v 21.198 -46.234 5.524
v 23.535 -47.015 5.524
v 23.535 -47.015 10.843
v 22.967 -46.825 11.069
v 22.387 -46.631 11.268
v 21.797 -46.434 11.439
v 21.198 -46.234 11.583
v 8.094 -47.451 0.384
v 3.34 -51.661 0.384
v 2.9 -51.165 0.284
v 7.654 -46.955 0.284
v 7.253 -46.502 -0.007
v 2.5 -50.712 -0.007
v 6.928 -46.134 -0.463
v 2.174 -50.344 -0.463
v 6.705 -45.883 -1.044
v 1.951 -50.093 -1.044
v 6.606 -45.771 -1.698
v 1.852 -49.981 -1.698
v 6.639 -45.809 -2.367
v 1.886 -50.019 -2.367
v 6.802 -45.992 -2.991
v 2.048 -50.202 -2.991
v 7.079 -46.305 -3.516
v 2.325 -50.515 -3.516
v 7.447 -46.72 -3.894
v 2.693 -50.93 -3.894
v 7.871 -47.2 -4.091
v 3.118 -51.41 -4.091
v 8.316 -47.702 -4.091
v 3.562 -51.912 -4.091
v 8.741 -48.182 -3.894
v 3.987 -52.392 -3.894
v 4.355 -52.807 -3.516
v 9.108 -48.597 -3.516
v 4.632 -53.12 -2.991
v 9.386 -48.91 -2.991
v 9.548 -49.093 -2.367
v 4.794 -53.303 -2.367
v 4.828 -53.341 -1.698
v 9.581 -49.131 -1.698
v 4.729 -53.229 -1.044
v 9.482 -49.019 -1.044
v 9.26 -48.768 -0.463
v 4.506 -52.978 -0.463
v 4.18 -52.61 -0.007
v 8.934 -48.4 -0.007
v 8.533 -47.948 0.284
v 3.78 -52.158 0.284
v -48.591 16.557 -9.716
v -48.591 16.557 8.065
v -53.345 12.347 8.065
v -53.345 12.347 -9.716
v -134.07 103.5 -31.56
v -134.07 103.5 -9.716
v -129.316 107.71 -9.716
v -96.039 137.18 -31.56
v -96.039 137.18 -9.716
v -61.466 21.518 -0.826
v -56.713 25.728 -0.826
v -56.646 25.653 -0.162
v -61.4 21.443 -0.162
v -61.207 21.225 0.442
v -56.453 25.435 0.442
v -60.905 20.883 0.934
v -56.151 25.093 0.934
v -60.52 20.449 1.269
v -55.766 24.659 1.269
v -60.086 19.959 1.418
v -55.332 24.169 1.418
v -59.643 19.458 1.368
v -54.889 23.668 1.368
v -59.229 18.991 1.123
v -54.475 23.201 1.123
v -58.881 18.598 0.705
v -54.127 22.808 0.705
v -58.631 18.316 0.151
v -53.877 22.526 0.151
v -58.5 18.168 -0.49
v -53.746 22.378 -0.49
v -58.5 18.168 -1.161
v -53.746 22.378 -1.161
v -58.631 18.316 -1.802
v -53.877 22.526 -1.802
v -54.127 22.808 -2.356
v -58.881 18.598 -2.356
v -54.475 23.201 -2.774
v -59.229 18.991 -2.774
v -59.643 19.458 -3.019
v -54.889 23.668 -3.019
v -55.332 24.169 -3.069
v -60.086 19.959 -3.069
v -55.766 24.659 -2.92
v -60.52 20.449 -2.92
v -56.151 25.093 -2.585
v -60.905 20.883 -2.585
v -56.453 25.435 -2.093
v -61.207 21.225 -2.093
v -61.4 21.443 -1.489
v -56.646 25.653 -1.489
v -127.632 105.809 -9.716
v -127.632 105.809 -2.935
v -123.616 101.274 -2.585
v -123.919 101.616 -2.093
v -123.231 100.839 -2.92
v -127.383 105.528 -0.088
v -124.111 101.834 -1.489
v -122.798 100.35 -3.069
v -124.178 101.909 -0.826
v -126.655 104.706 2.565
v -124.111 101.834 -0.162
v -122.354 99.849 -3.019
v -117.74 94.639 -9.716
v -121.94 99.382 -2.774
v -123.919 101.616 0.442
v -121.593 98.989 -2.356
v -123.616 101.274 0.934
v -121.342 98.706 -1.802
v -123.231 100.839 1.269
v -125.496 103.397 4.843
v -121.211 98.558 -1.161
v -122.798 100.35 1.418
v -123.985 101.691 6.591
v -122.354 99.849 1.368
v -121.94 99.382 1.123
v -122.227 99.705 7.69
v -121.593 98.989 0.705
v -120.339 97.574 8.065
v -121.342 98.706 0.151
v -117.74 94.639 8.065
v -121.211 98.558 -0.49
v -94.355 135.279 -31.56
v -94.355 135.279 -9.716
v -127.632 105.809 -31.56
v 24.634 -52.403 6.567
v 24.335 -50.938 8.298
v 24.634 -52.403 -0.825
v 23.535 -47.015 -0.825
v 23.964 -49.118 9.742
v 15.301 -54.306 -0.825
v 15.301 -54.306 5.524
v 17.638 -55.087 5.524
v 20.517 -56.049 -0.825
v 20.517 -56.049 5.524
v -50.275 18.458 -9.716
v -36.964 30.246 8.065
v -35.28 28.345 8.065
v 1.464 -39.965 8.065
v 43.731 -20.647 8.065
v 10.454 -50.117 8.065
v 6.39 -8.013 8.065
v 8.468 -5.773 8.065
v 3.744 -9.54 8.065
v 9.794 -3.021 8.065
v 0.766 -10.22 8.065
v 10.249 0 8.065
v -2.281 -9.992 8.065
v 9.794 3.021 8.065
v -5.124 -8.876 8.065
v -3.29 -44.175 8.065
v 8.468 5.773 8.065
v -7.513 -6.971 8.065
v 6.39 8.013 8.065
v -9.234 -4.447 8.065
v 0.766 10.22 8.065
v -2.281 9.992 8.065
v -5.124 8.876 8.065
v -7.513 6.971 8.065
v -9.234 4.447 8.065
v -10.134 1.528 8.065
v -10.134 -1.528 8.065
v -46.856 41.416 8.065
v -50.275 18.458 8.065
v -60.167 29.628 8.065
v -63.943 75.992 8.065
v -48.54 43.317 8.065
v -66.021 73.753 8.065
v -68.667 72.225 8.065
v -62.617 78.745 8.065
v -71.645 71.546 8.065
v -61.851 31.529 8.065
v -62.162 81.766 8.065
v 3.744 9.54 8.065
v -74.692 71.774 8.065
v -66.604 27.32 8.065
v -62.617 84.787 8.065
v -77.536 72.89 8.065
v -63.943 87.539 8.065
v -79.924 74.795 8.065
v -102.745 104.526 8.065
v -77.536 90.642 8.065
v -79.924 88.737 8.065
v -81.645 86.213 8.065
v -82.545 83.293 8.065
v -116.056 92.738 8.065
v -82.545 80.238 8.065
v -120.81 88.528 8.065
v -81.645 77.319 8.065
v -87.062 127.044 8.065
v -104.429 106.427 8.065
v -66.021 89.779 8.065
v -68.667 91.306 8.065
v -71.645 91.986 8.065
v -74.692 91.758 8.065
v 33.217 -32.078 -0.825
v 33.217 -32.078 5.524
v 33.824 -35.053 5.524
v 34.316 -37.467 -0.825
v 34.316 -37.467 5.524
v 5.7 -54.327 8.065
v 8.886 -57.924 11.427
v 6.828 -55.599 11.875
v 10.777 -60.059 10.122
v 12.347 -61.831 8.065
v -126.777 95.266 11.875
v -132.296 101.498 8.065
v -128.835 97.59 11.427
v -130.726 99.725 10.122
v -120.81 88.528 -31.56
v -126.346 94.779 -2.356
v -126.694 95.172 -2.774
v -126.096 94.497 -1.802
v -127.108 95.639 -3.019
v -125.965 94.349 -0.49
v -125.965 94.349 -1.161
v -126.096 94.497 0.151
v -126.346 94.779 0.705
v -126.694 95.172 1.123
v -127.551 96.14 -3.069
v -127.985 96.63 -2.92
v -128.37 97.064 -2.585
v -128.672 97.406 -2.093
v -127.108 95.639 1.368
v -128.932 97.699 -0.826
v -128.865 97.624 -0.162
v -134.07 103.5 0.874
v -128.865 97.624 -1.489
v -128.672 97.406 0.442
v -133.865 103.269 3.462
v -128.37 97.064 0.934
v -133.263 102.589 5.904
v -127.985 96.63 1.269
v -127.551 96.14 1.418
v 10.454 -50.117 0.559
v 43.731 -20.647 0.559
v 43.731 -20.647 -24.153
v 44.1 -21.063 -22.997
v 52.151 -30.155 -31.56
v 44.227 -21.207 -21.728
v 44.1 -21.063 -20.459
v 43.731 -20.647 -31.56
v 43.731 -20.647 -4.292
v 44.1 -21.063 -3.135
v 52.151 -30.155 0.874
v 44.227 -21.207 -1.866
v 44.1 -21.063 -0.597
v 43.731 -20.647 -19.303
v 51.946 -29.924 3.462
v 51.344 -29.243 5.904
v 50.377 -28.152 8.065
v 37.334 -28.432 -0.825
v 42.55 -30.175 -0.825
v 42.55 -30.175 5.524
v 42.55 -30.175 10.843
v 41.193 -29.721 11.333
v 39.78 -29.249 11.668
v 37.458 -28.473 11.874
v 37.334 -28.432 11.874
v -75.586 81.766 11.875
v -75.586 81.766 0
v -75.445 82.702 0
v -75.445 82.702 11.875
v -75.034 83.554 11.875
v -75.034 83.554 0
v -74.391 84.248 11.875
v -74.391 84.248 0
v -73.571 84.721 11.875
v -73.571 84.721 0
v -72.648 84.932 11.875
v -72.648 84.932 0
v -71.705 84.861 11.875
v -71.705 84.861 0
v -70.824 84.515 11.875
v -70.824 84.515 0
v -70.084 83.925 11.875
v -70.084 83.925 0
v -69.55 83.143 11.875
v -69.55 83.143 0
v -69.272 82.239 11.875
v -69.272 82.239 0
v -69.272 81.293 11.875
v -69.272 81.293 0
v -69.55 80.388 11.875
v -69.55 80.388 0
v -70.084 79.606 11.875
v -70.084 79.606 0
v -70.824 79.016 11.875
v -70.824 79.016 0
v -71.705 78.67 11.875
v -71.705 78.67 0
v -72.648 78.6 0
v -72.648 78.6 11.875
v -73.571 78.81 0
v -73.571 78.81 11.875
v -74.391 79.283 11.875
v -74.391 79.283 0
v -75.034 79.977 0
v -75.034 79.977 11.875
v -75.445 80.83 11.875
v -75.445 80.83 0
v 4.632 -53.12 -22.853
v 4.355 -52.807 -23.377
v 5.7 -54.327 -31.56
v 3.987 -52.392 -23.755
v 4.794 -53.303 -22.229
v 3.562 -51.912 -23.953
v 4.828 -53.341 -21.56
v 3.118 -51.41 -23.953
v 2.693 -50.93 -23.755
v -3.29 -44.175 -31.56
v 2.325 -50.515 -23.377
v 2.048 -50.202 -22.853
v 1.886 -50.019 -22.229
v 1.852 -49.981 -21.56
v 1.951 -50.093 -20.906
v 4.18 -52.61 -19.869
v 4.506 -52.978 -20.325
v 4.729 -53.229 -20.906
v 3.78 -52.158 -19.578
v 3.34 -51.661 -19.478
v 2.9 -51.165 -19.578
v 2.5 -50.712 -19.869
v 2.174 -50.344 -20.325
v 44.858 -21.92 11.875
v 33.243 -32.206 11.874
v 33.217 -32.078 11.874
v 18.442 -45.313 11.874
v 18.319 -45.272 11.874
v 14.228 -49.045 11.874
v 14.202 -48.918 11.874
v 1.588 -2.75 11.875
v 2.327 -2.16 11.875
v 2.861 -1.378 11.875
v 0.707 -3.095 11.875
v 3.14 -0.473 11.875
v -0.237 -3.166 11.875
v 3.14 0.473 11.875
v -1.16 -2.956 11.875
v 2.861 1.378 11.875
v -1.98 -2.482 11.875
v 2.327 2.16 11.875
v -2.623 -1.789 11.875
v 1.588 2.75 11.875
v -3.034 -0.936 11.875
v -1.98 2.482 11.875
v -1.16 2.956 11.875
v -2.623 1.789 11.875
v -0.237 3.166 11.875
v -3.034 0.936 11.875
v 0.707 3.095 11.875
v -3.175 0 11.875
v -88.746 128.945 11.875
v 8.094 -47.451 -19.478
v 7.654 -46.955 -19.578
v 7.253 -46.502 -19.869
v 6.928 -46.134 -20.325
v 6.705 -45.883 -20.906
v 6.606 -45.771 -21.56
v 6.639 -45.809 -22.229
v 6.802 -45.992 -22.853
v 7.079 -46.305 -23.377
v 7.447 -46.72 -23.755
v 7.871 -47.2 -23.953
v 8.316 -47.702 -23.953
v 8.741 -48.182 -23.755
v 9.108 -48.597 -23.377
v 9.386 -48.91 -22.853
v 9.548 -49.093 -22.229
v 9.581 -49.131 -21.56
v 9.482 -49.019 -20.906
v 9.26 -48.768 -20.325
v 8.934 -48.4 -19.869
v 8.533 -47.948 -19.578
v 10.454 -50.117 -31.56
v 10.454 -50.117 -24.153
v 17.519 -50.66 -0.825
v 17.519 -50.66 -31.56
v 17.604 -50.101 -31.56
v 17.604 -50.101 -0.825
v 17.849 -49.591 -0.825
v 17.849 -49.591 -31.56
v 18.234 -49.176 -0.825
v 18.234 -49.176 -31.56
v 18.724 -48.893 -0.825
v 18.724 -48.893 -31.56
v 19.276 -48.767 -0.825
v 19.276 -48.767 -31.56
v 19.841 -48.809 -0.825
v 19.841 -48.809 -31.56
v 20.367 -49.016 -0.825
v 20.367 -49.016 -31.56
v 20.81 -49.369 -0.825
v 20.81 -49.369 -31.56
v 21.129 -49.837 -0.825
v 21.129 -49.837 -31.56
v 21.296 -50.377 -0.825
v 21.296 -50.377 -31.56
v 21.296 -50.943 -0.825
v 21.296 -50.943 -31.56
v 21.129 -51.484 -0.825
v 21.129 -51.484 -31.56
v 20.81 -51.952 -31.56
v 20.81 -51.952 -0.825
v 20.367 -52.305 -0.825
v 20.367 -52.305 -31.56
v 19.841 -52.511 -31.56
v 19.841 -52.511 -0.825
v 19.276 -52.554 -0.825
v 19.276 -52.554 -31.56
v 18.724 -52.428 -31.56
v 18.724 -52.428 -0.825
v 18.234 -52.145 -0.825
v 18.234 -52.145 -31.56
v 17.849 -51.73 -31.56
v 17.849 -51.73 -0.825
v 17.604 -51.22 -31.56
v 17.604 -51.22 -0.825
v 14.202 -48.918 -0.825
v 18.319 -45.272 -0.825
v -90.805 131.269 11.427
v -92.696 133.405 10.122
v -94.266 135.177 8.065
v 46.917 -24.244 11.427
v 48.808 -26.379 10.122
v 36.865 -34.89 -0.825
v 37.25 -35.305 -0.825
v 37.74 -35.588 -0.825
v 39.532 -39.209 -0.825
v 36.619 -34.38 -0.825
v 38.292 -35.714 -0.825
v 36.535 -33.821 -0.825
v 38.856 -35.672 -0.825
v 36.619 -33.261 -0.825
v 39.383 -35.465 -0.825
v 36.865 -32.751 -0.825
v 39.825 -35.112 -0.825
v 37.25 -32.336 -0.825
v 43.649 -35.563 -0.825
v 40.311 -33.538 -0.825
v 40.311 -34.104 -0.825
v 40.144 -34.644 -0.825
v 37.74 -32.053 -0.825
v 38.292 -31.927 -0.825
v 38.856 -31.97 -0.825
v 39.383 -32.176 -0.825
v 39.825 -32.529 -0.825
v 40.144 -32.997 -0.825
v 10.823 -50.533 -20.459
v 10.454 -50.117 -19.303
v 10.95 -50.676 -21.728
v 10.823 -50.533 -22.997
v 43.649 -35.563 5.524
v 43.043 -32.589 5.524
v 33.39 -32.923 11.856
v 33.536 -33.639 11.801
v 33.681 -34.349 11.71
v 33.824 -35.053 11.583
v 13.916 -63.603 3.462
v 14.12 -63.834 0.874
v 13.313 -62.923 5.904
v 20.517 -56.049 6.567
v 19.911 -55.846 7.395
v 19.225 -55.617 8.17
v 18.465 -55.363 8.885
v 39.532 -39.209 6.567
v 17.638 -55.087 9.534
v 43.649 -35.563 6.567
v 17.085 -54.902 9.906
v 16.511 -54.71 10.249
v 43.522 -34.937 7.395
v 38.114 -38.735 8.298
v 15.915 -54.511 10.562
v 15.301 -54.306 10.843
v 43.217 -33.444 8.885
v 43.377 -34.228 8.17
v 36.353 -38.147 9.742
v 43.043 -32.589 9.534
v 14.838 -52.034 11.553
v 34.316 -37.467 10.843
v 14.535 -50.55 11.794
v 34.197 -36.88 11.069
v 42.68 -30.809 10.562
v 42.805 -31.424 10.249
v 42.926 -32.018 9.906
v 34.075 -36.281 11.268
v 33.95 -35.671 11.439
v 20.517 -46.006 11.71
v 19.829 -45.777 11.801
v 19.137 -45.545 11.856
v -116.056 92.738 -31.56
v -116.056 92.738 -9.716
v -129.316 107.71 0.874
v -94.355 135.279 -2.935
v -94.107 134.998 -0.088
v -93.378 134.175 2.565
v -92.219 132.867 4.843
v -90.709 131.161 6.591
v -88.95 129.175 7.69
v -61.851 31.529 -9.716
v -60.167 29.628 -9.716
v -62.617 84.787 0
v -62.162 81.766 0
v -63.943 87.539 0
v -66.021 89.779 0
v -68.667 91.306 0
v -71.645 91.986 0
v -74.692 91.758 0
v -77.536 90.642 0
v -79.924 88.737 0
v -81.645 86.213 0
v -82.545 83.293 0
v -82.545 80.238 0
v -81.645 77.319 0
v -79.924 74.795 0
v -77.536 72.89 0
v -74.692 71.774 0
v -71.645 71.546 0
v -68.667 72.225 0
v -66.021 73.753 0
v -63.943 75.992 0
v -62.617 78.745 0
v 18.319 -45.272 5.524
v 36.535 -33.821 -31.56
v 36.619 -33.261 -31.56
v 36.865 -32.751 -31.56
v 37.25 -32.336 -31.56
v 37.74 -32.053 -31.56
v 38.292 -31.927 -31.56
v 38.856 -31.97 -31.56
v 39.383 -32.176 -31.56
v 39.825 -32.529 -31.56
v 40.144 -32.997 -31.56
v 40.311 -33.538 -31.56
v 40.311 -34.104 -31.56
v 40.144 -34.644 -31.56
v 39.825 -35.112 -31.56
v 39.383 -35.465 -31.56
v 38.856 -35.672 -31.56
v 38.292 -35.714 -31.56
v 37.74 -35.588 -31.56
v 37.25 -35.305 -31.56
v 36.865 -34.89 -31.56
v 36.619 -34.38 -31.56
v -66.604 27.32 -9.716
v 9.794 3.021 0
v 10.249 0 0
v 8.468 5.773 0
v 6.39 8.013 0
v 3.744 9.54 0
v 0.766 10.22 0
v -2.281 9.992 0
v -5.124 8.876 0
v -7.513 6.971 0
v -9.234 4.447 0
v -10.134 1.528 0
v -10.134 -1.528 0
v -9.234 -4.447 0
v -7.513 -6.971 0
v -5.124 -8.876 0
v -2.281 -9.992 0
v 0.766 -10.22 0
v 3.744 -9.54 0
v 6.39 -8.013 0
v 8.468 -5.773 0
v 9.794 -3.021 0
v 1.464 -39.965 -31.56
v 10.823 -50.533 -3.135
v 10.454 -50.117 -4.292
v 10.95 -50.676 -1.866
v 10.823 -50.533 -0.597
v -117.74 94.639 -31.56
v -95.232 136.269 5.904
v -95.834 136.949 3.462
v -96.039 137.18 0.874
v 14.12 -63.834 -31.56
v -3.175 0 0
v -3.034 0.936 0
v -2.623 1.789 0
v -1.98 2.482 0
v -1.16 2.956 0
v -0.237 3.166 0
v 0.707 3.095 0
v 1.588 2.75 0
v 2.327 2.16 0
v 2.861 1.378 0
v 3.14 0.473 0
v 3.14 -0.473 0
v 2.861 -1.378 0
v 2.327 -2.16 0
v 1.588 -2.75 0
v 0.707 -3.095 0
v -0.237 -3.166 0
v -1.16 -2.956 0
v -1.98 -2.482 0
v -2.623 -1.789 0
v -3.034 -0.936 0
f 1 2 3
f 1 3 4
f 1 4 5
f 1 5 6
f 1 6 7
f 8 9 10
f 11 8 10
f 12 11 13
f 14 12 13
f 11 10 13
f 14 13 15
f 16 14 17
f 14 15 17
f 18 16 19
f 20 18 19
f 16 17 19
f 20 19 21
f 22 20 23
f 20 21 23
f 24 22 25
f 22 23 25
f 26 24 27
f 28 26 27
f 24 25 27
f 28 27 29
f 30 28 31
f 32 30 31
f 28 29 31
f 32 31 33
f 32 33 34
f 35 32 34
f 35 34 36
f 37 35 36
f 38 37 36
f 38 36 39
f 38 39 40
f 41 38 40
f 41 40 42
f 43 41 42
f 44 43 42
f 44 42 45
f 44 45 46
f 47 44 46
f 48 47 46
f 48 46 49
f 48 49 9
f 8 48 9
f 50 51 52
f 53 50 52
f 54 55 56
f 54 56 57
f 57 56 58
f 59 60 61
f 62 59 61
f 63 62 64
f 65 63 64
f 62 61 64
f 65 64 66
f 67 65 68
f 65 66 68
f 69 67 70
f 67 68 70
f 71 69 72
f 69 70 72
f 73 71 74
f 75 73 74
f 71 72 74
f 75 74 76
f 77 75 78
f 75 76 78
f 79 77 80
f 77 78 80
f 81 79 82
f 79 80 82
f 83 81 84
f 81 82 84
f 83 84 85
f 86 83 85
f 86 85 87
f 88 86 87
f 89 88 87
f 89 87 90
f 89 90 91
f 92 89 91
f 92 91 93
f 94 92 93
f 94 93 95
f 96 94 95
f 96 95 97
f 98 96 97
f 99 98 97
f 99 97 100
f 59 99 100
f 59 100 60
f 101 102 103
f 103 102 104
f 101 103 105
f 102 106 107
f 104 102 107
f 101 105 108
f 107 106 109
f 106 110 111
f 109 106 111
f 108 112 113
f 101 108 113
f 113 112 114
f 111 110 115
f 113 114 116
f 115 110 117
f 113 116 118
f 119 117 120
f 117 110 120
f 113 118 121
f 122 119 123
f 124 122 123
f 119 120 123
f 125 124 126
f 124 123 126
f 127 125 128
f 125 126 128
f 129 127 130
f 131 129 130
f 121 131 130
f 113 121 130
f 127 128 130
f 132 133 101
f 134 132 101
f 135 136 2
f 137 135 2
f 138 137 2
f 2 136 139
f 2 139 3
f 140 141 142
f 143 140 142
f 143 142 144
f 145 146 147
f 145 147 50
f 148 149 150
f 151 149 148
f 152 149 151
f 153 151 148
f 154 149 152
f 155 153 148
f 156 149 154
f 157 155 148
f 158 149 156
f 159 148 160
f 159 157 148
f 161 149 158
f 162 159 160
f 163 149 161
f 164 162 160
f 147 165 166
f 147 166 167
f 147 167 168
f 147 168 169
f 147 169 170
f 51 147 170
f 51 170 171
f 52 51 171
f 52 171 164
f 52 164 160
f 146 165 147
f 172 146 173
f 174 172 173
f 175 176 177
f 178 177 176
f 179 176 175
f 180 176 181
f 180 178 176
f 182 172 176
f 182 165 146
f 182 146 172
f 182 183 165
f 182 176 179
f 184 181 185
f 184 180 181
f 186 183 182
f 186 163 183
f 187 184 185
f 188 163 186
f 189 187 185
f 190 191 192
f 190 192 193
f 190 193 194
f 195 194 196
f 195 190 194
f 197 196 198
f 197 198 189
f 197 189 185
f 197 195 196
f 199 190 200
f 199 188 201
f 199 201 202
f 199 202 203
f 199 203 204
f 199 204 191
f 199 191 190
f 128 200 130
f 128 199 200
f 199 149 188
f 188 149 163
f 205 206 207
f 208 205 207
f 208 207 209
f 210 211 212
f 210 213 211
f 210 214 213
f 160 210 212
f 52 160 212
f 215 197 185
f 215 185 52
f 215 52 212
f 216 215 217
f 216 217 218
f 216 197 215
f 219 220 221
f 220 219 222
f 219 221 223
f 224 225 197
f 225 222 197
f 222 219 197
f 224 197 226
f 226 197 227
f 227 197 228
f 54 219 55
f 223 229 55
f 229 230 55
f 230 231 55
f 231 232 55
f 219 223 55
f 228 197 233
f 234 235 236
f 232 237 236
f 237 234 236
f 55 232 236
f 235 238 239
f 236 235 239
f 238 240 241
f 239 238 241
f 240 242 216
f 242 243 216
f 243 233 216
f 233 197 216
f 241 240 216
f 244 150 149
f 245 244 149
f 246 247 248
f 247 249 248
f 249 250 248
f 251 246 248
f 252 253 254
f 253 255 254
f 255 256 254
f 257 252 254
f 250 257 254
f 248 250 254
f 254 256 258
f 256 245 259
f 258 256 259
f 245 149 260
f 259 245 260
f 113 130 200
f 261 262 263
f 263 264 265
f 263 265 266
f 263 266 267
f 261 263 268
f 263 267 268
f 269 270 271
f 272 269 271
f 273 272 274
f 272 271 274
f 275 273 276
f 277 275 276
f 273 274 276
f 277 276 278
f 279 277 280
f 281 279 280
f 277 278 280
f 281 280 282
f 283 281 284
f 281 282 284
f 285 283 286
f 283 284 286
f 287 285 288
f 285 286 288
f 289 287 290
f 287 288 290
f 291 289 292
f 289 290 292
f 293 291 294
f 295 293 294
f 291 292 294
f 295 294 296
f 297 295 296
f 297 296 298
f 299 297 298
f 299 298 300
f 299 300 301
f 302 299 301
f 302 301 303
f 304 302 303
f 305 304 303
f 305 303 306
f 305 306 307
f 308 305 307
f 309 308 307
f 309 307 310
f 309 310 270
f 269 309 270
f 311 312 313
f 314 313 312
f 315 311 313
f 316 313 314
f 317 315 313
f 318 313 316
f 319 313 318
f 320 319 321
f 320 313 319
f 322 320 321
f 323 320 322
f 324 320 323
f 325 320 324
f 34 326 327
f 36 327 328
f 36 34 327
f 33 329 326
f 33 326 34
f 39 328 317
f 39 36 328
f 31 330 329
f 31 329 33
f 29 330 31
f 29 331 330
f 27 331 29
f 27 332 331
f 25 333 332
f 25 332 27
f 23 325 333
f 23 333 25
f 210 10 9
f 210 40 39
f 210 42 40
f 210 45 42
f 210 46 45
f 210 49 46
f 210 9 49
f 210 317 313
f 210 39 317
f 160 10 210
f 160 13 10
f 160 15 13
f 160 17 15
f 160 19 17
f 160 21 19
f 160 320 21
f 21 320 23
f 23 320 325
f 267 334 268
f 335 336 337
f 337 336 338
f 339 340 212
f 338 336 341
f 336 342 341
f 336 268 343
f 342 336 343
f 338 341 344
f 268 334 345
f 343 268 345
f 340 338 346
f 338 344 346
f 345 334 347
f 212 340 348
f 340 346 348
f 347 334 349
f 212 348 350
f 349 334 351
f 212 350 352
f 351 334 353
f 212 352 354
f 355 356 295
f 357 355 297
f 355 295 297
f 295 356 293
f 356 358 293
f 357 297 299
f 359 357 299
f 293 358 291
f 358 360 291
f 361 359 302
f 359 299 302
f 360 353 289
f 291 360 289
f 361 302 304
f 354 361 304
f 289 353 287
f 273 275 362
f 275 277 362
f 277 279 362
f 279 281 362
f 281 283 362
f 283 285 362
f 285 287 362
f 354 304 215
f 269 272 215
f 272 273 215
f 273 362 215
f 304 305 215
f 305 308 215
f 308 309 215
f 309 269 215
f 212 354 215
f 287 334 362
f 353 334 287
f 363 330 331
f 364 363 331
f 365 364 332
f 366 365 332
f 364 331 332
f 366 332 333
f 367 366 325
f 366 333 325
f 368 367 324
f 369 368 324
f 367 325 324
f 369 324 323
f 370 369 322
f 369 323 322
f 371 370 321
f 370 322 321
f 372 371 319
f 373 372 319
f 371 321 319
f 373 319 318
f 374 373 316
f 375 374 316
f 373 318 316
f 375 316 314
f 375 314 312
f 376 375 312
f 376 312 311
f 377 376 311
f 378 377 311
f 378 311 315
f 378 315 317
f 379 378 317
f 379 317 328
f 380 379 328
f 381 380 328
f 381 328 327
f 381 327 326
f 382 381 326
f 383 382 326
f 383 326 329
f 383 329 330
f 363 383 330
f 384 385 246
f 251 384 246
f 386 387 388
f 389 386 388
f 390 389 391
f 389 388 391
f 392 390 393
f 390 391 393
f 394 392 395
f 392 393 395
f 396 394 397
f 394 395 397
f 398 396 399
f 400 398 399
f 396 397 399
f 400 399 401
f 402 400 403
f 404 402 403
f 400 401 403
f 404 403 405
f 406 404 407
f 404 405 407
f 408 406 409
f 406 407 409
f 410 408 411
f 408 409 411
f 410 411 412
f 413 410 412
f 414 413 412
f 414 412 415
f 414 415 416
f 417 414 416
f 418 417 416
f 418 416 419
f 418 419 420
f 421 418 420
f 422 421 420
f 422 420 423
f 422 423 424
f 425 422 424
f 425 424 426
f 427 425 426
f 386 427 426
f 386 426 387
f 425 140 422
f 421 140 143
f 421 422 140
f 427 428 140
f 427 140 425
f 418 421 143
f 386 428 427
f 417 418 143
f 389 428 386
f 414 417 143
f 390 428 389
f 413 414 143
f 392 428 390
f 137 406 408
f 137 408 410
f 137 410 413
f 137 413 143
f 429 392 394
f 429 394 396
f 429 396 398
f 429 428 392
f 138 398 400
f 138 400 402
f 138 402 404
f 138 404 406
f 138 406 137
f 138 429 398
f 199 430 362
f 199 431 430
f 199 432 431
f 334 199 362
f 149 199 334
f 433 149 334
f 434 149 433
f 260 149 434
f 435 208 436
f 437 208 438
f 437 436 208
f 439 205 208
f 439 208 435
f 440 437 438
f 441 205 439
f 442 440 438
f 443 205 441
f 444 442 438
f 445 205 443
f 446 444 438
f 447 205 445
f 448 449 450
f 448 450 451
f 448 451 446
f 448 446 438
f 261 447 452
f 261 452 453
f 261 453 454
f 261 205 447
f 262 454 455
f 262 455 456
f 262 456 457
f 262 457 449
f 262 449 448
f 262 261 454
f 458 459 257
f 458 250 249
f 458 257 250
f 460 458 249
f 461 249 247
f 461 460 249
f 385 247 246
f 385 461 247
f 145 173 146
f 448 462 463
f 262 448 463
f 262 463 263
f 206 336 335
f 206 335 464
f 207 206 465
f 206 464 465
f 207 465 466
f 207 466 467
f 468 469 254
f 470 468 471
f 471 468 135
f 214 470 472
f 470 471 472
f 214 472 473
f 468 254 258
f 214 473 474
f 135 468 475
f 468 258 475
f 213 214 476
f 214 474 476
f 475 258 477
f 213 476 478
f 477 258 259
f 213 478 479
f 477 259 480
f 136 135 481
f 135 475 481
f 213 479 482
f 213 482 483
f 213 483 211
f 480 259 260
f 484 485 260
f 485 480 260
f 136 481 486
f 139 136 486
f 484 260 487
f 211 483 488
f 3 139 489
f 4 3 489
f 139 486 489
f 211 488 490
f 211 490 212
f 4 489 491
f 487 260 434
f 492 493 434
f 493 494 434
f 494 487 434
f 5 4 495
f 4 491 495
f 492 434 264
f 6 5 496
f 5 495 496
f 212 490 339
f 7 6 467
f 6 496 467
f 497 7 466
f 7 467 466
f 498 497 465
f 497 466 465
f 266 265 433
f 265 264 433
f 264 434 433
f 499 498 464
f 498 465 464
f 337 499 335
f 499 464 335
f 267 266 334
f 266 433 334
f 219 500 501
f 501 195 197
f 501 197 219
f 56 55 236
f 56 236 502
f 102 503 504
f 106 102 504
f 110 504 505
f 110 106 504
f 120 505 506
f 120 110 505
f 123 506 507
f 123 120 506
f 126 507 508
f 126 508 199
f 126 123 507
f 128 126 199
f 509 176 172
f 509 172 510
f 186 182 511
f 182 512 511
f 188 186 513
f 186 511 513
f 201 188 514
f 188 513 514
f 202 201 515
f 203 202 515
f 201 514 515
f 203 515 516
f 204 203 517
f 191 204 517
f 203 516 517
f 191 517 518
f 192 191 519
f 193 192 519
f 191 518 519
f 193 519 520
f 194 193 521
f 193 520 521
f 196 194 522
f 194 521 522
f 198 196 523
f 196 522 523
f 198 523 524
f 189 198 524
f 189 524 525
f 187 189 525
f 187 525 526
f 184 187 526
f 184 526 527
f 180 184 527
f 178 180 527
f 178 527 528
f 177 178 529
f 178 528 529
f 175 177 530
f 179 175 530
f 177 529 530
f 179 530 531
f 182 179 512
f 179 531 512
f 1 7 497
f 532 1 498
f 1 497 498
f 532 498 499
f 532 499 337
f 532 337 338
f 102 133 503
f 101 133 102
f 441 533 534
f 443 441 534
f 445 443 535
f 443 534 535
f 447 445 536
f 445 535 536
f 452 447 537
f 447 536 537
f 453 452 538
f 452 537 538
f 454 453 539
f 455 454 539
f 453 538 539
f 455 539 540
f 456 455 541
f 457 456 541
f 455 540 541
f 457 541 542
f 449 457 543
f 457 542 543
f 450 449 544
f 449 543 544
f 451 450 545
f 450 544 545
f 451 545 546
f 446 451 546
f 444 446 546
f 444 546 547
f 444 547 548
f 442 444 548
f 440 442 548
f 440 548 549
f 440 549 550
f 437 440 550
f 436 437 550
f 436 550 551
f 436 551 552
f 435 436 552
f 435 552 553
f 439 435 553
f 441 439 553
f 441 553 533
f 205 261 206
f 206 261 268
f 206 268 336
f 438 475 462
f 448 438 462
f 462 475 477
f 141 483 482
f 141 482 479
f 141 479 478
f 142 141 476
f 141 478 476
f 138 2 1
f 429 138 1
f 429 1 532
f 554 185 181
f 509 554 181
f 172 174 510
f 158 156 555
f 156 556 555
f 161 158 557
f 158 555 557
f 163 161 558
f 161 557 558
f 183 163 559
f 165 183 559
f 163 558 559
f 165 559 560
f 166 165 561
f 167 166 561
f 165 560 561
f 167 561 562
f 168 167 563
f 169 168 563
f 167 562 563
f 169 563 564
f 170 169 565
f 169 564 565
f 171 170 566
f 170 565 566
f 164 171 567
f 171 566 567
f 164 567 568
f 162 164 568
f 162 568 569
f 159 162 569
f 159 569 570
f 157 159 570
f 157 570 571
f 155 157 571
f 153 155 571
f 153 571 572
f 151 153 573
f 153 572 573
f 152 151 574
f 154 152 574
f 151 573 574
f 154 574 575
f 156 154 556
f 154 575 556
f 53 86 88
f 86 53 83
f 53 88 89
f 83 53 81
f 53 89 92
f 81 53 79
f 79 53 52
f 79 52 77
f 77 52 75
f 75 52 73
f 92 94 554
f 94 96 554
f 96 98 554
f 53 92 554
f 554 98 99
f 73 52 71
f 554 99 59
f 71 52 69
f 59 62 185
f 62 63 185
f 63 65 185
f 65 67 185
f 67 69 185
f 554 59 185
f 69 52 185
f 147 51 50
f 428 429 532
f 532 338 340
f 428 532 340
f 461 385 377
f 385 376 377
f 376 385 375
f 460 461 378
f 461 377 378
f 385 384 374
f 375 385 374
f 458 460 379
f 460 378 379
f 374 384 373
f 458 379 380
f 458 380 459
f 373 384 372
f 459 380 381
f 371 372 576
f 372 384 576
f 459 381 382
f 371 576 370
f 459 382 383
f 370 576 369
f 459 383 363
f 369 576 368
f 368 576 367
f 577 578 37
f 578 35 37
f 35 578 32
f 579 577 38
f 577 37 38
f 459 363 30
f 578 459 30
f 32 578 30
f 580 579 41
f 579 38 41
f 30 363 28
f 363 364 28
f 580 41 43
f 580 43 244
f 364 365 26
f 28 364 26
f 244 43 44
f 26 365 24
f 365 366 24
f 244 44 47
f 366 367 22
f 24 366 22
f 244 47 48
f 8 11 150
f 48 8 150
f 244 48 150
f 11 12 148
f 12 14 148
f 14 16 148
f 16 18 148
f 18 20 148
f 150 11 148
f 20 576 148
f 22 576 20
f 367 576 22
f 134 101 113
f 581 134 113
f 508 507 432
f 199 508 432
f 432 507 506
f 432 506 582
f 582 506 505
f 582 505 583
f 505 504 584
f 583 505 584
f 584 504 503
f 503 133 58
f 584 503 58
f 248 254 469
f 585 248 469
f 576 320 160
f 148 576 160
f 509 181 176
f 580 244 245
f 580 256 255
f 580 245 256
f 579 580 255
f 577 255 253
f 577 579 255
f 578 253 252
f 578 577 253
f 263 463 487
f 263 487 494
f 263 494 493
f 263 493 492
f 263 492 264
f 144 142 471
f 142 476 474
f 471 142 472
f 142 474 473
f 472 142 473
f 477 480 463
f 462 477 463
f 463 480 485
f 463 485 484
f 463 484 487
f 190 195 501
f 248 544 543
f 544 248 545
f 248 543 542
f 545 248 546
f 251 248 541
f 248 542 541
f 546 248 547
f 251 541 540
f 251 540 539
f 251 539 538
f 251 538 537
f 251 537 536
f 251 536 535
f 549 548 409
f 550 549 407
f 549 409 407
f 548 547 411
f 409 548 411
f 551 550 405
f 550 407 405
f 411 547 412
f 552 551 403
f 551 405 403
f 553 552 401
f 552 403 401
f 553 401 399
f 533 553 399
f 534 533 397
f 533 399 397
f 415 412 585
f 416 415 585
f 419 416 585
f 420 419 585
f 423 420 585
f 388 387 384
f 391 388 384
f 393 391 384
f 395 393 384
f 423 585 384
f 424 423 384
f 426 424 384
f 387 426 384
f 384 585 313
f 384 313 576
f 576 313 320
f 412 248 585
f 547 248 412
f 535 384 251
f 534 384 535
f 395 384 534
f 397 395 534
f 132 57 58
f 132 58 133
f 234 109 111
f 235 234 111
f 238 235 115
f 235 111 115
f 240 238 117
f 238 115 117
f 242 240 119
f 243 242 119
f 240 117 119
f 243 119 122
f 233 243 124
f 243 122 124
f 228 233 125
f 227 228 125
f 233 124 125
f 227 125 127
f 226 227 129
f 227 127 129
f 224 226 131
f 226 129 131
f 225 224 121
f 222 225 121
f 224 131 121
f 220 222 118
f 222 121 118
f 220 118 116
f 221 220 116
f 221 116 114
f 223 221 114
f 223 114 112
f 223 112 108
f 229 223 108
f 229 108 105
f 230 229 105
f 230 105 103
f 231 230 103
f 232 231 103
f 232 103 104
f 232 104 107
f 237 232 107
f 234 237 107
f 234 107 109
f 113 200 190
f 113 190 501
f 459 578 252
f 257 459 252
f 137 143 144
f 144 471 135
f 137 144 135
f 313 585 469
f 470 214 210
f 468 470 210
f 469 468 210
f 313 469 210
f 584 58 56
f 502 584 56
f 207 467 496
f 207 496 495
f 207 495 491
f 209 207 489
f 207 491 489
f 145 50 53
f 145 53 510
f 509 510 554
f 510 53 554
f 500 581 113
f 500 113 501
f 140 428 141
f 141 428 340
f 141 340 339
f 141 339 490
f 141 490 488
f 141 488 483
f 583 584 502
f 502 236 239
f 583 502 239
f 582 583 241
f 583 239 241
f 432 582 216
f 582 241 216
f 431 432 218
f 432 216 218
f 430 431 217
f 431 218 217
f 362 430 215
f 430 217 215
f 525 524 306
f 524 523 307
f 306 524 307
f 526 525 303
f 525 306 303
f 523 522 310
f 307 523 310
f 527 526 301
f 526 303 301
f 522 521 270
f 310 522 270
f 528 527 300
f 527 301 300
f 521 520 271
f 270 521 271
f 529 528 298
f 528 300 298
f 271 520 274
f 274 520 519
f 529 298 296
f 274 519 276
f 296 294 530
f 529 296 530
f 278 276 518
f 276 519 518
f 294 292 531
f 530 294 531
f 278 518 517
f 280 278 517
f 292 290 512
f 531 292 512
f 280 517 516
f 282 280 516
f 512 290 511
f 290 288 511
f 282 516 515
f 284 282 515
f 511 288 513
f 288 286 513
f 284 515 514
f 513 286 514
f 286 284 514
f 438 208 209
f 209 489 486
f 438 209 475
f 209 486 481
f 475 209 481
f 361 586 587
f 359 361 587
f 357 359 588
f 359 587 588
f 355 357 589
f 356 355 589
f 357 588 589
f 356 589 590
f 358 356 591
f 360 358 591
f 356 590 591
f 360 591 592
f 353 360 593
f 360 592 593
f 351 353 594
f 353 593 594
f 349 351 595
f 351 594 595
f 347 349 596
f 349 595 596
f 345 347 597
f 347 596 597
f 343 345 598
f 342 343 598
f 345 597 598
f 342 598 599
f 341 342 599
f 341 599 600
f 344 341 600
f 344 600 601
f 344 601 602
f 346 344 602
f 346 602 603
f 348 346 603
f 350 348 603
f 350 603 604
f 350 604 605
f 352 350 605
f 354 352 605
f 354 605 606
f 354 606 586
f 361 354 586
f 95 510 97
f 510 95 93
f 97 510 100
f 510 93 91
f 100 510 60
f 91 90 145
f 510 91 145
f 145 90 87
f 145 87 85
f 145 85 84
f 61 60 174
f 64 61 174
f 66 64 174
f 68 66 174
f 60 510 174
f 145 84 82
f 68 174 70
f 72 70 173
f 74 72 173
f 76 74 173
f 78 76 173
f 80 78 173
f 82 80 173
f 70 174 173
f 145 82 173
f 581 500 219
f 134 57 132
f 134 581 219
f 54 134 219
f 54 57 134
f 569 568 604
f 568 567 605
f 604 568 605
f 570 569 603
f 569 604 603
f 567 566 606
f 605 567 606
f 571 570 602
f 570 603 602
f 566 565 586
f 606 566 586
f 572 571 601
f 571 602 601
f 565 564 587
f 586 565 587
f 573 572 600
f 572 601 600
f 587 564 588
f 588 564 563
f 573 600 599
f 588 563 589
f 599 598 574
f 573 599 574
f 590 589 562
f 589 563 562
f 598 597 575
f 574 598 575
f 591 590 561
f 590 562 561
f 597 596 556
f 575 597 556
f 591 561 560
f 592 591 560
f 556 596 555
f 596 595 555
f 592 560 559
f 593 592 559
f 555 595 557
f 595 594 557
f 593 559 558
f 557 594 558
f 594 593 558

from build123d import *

# Parameters (mm, degrees)
SKETCH1_R                   = 10.2489
BOSS_EXTRUDE1_DEPTH         = 2.9845
BOSS_EXTRUDE1_2_DEPTH       = 2.9845
SKETCH2_R                   = 10.2489
BOSS_EXTRUDE2_DEPTH         = 5.08
BOSS_EXTRUDE3_DEPTH         = 3.81
F_1_4_0_25_DIAMETER_HOLE1_D = 6.35
BOSS_EXTRUDE4_DEPTH         = 17.78
SKETCH8_R                   = 2.25
CUT_EXTRUDE1_DEPTH          = 17.78
SKETCH9_W                   = 17.78
SKETCH9_H                   = 2.54
BOSS_EXTRUDE5_DEPTH         = 17.78
CUT_EXTRUDE2_REACH          = 251.039
CUT_EXTRUDE3_DEPTH          = 20
BOSS_EXTRUDE6_DEPTH         = 2.54
BOSS_EXTRUDE7_DEPTH         = 39.624
CUT_EXTRUDE5_DEPTH          = 6.35
F_6_CLEARANCE_HOLE1_D       = 3.7973
SKETCH19_W                  = 39.624
SKETCH19_H                  = 13.560471889
BOSS_EXTRUDE8_DEPTH         = 6.35
M4_CLEARANCE_HOLE1_D        = 4.5
SKETCH20_R                  = 4.308
CUT_EXTRUDE6_DEPTH          = 195.822050963
FILLET1_R                   = 11
CUT_EXTRUDE7_DEPTH          = 6.35
BOSS_EXTRUDE9_DEPTH         = 21.844


with BuildPart() as part:
    # Sketch1 → Boss-Extrude1 (new body)
    with BuildSketch(Plane.XY):
        Circle(SKETCH1_R)
    extrude(amount=BOSS_EXTRUDE1_DEPTH)



with BuildPart() as body_2:
    # Sketch1 → Boss-Extrude1 2 (new body)
    with BuildSketch(Plane.XY):
        with Locations((-72.411066703, 81.765798589)):
            Circle(SKETCH1_R)
    extrude(amount=BOSS_EXTRUDE1_2_DEPTH)


with BuildPart() as part_1:
    add(part.part)

    add(body_2.part)  # Boss-Extrude2 merges body 2
    # Sketch2 → Boss-Extrude2 (add)
    with BuildSketch(Plane.XY.offset(2.9845)):
        with Locations((-72.411066703, 81.765798589)):
            Circle(SKETCH2_R)
        Circle(SKETCH2_R)
    extrude(amount=BOSS_EXTRUDE2_DEPTH)

    # Sketch3 → Boss-Extrude3 (add)
    with BuildSketch(Plane.XY.offset(8.0645)):
        Polygon((-134.069705847, 103.500499391), (-96.039101852, 137.180065299), (52.150988145, -30.154592279), (14.12038415, -63.834158187), align=None)
    extrude(amount=BOSS_EXTRUDE3_DEPTH)

    # 1/4 (0.25) Diameter Hole1 (through all)
    with Locations(Plane.XY.offset(11.8745)):
        with Locations((0, 0), (-72.411066703, 81.765798589)):
            Hole(F_1_4_0_25_DIAMETER_HOLE1_D / 2)

    # Sketch7 → Boss-Extrude4 (add)
    with BuildSketch(Plane(origin=(0, 0, 8.0645), x_dir=(-1, 0, 0), z_dir=(0, 0, -1))):
        Polygon((53.34482504, 12.346831233), (66.604496657, 27.319509971), (61.850671158, 31.529455709), (48.59099954, 16.556776971), align=None)
        Polygon((120.810034229, 88.527820652), (134.069705847, 103.500499391), (129.315880348, 107.710445129), (116.05620873, 92.737766391), align=None)
    extrude(amount=BOSS_EXTRUDE4_DEPTH)

    # Sketch8 → Cut-Extrude1 (cut)
    with BuildSketch(Plane(origin=(-19.015301997, -16.839782954, 0), x_dir=(0, 0, -1), z_dir=(0.7486339369082552, 0.6629835808745542, 0))):
        with Locations(Location((0.8255, 54.61, 0), (0, 0, 90))):
            Circle(SKETCH8_R)
        with Locations(Location((0.8255, 156.37, 0), (0, 0, 90))):
            Circle(SKETCH8_R)
    extrude(amount=-CUT_EXTRUDE1_DEPTH, mode=Mode.SUBTRACT)

    # Sketch9 → Boss-Extrude5 (add)
    with BuildSketch(Plane(origin=(-19.015301997, -16.839782954, 0), x_dir=(0, 0, -1), z_dir=(0.7486339369082552, 0.6629835808745542, 0))):
        with Locations((0.8255, 63.34)):
            Rectangle(SKETCH9_W, SKETCH9_H)
        with Locations((0.8255, 45.88)):
            Rectangle(SKETCH9_W, SKETCH9_H)
        with Locations((0.8255, 165.1)):
            Rectangle(SKETCH9_W, SKETCH9_H)
        with Locations((0.8255, 147.64)):
            Rectangle(SKETCH9_W, SKETCH9_H)
    extrude(amount=BOSS_EXTRUDE5_DEPTH)

    # Cut-Extrude2: up to this face of the body (flat: up to its plane)
    cut_extrude2_end = Plane(part_1.part.faces().sort_by_distance((-111.777765781, 96.526717556, -0.8255))[0])
    # Sketch10 → Cut-Extrude2 (cut, up to the picked face)
    with BuildSketch(Plane(origin=(-110.30057835, 124.550228083, 0), x_dir=(0.7486339369082557, 0.6629835808745536, 0), z_dir=(-0.6629835808745536, 0.7486339369082557, 0)), mode=Mode.PRIVATE) as cut_extrude2_sk1:
        Polygon((-7.62, 9.7155), (-7.62, -8.0645), (-25.4, 9.7155), align=None)
    cut_extrude2_tool1 = split(extrude(cut_extrude2_sk1.sketch, amount=-CUT_EXTRUDE2_REACH, mode=Mode.PRIVATE), bisect_by=cut_extrude2_end, keep=Keep.BOTH, mode=Mode.PRIVATE)
    add(cut_extrude2_tool1.solids().sort_by(Axis((-120.442073, 115.569011, -3.788833), (0.6629835808745536, -0.7486339369082557, 0)))[0], mode=Mode.SUBTRACT)

    # Sketch11 → Cut-Extrude3 (cut)
    with BuildSketch(Plane(origin=(-42.83536916, 48.369238664, 0), x_dir=(0.7486339369082559, 0.6629835808745536, 0), z_dir=(-0.6629835808745536, 0.7486339369082559, 0))):
        Polygon((-7.62, 9.7155), (-7.62, -8.0645), (-25.4, 9.7155), align=None)
    extrude(amount=-CUT_EXTRUDE3_DEPTH, mode=Mode.SUBTRACT)

    # Sketch13 → Boss-Extrude6 (add)
    with BuildSketch(Plane(origin=(-110.30057835, 124.550228083, 0), x_dir=(0.7486339369082557, 0.6629835808745536, 0), z_dir=(-0.6629835808745536, 0.7486339369082557, 0))):
        Polygon((-25.4, 9.7155), (19.05, 9.7155), (19.05, -8.0645), (-7.62, -8.0645), align=None)
    extrude(amount=-BOSS_EXTRUDE6_DEPTH)

    # Sketch14 → Boss-Extrude7 (add)
    with BuildSketch(Plane(origin=(0, 0, 8.0645), x_dir=(-1, 0, 0), z_dir=(0, 0, -1))):
        Polygon((-52.150988145, -30.154592279), (-14.12038415, -63.834158187), (-5.700492673, -54.326507188), (-43.731096668, -20.64694128), align=None)
    extrude(amount=BOSS_EXTRUDE7_DEPTH)

    # Sketch15 → Cut-Extrude5 (cut)
    with BuildSketch(Plane.XY.offset(11.8745)):
        Polygon((38.433391408, -33.820658256), (42.550325055, -30.174738298), (37.334398928, -28.432329153), (33.21746528, -32.078249111), (33.824088825, -35.052507224), align=None)
        Polygon((43.649317536, -35.563067402), (43.042693991, -32.588809289), (38.433391408, -33.820658256), (34.31645776, -37.466578215), (39.532383888, -39.20898736), align=None)
        Polygon((38.433391408, -33.820658256), (43.042693991, -32.588809289), (42.550325055, -30.174738298), align=None)
        Polygon((34.31645776, -37.466578215), (38.433391408, -33.820658256), (33.824088825, -35.052507224), align=None)
        Polygon((21.198191786, -46.233889763), (19.41808941, -50.660441211), (23.535023058, -47.014521252), align=None)
        Polygon((15.301155763, -54.306361169), (17.637987035, -55.086992658), (19.41808941, -50.660441211), align=None)
        Polygon((14.202163283, -48.918032065), (15.301155763, -54.306361169), (19.41808941, -50.660441211), (21.198191786, -46.233889763), (18.31909693, -45.272112107), align=None)
        Polygon((19.41808941, -50.660441211), (17.637987035, -55.086992658), (20.51708189, -56.048770314), (24.634015538, -52.402850356), (23.535023058, -47.014521252), align=None)
    extrude(amount=-CUT_EXTRUDE5_DEPTH, mode=Mode.SUBTRACT)

    # #6 Clearance Hole1 (through all)
    with Locations(Plane.XY.offset(5.5245)):
        with Locations((19.41808941, -50.660441211), (38.433391408, -33.820658256)):
            Hole(F_6_CLEARANCE_HOLE1_D / 2)

    # Sketch19 → Boss-Extrude8 (add)
    with BuildSketch(Plane(origin=(-23.769127497, -21.049728693, 0), x_dir=(0, 0, 1), z_dir=(-0.7486339369082559, -0.6629835808745536, 0))):
        with Locations((-11.7475, -37.669764056)):
            Rectangle(SKETCH19_W, SKETCH19_H)
    extrude(amount=-BOSS_EXTRUDE8_DEPTH)

    # M4 Clearance Hole1 (through all)
    with Locations(Plane(origin=(-19.015301997, -16.839782954, 0), x_dir=(0, 0, -1), z_dir=(0.7486339369082555, 0.6629835808745539, 0))):
        with Locations((1.866346616, -40.889528111), (21.728039849, -40.889528111)):
            Hole(M4_CLEARANCE_HOLE1_D / 2)

    # Sketch20 → Cut-Extrude6 (cut, through all)
    with BuildSketch(Plane(origin=(-19.015301997, -16.839782954, 0), x_dir=(0, 0, -1), z_dir=(0.7486339369082555, 0.6629835808745539, 0))):
        with Locations((21.728039849, -40.889528111)):
            Circle(SKETCH20_R)
        with Locations((1.866346616, -40.889528111)):
            Circle(SKETCH20_R)
    extrude(amount=CUT_EXTRUDE6_DEPTH, mode=Mode.SUBTRACT)

    # Fillet1
    # the kernel refuses this fillet: 11 mm, written as the material it adds along each edge
    with BuildSketch(Plane(origin=(-127.631902052, 105.808914929, 8.0645), x_dir=(0.6629835808745532, -0.7486339369082561, 1.2918958832001814e-15), z_dir=(0.7486339369082562, 0.6629835808745532, 0))) as fillet1_piece_1:
        with BuildLine():
            CenterArc((FILLET1_R, FILLET1_R), FILLET1_R, 180, 90)
            Line((0, FILLET1_R), (0, 0))
            Line((0, 0), (FILLET1_R, 0))
        make_face()
    extrude(amount=44.45)
    # the kernel refuses this fillet: 11 mm, written as the material it takes off along each edge
    with BuildSketch(Plane(origin=(-154.657139112, 85.268450917, 11.8745), x_dir=(0, 0, -1), z_dir=(0.7486339369082557, 0.6629835808745537, 0))) as fillet1_2_piece_1:
        with BuildLine():
            CenterArc((FILLET1_R, -FILLET1_R), FILLET1_R, 90, 90)
            Line((0, -FILLET1_R), (0, 0))
            Line((0, 0), (FILLET1_R, 0))
        make_face()
    extrude(amount=105.8, mode=Mode.SUBTRACT)
    with BuildSketch(Plane(origin=(72.73842141, -11.922543805, 11.8745), x_dir=(-0.6629835808745536, 0.7486339369082557, 0), z_dir=(-0.7486339369082559, -0.6629835808745537, 0))) as fillet1_2_piece_2:
        with BuildLine():
            CenterArc((FILLET1_R, FILLET1_R), FILLET1_R, 180, 90)
            Line((0, FILLET1_R), (0, 0))
            Line((0, 0), (FILLET1_R, 0))
        make_face()
    extrude(amount=105.8, mode=Mode.SUBTRACT)

    # Sketch23 → Cut-Extrude7 (cut)
    with BuildSketch(Plane.XY.offset(5.5245)):
        Polygon((37.334398928, -28.432329153), (33.21746528, -32.078249111), (34.31645776, -37.466578215), (39.532383888, -39.20898736), (43.649317536, -35.563067402), (42.550325055, -30.174738298), align=None)
        Polygon((14.202163283, -48.918032065), (15.301155763, -54.306361169), (20.51708189, -56.048770314), (24.634015538, -52.402850356), (23.535023058, -47.014521252), (18.31909693, -45.272112107), align=None)
    extrude(amount=-CUT_EXTRUDE7_DEPTH, mode=Mode.SUBTRACT)

    # Sketch24 → Boss-Extrude9 (add)
    with BuildSketch(Plane(origin=(0, 0, -9.7155), x_dir=(-1, 0, 0), z_dir=(0, 0, -1))):
        Polygon((117.740187025, 94.639296591), (116.05620873, 92.737766391), (120.810034229, 88.527820652), (134.069705847, 103.500499391), (96.039101852, 137.180065299), (94.355123557, 135.278535099), (127.631902052, 105.808914929), align=None)
    extrude(amount=BOSS_EXTRUDE9_DEPTH)


solid = part_1.part
